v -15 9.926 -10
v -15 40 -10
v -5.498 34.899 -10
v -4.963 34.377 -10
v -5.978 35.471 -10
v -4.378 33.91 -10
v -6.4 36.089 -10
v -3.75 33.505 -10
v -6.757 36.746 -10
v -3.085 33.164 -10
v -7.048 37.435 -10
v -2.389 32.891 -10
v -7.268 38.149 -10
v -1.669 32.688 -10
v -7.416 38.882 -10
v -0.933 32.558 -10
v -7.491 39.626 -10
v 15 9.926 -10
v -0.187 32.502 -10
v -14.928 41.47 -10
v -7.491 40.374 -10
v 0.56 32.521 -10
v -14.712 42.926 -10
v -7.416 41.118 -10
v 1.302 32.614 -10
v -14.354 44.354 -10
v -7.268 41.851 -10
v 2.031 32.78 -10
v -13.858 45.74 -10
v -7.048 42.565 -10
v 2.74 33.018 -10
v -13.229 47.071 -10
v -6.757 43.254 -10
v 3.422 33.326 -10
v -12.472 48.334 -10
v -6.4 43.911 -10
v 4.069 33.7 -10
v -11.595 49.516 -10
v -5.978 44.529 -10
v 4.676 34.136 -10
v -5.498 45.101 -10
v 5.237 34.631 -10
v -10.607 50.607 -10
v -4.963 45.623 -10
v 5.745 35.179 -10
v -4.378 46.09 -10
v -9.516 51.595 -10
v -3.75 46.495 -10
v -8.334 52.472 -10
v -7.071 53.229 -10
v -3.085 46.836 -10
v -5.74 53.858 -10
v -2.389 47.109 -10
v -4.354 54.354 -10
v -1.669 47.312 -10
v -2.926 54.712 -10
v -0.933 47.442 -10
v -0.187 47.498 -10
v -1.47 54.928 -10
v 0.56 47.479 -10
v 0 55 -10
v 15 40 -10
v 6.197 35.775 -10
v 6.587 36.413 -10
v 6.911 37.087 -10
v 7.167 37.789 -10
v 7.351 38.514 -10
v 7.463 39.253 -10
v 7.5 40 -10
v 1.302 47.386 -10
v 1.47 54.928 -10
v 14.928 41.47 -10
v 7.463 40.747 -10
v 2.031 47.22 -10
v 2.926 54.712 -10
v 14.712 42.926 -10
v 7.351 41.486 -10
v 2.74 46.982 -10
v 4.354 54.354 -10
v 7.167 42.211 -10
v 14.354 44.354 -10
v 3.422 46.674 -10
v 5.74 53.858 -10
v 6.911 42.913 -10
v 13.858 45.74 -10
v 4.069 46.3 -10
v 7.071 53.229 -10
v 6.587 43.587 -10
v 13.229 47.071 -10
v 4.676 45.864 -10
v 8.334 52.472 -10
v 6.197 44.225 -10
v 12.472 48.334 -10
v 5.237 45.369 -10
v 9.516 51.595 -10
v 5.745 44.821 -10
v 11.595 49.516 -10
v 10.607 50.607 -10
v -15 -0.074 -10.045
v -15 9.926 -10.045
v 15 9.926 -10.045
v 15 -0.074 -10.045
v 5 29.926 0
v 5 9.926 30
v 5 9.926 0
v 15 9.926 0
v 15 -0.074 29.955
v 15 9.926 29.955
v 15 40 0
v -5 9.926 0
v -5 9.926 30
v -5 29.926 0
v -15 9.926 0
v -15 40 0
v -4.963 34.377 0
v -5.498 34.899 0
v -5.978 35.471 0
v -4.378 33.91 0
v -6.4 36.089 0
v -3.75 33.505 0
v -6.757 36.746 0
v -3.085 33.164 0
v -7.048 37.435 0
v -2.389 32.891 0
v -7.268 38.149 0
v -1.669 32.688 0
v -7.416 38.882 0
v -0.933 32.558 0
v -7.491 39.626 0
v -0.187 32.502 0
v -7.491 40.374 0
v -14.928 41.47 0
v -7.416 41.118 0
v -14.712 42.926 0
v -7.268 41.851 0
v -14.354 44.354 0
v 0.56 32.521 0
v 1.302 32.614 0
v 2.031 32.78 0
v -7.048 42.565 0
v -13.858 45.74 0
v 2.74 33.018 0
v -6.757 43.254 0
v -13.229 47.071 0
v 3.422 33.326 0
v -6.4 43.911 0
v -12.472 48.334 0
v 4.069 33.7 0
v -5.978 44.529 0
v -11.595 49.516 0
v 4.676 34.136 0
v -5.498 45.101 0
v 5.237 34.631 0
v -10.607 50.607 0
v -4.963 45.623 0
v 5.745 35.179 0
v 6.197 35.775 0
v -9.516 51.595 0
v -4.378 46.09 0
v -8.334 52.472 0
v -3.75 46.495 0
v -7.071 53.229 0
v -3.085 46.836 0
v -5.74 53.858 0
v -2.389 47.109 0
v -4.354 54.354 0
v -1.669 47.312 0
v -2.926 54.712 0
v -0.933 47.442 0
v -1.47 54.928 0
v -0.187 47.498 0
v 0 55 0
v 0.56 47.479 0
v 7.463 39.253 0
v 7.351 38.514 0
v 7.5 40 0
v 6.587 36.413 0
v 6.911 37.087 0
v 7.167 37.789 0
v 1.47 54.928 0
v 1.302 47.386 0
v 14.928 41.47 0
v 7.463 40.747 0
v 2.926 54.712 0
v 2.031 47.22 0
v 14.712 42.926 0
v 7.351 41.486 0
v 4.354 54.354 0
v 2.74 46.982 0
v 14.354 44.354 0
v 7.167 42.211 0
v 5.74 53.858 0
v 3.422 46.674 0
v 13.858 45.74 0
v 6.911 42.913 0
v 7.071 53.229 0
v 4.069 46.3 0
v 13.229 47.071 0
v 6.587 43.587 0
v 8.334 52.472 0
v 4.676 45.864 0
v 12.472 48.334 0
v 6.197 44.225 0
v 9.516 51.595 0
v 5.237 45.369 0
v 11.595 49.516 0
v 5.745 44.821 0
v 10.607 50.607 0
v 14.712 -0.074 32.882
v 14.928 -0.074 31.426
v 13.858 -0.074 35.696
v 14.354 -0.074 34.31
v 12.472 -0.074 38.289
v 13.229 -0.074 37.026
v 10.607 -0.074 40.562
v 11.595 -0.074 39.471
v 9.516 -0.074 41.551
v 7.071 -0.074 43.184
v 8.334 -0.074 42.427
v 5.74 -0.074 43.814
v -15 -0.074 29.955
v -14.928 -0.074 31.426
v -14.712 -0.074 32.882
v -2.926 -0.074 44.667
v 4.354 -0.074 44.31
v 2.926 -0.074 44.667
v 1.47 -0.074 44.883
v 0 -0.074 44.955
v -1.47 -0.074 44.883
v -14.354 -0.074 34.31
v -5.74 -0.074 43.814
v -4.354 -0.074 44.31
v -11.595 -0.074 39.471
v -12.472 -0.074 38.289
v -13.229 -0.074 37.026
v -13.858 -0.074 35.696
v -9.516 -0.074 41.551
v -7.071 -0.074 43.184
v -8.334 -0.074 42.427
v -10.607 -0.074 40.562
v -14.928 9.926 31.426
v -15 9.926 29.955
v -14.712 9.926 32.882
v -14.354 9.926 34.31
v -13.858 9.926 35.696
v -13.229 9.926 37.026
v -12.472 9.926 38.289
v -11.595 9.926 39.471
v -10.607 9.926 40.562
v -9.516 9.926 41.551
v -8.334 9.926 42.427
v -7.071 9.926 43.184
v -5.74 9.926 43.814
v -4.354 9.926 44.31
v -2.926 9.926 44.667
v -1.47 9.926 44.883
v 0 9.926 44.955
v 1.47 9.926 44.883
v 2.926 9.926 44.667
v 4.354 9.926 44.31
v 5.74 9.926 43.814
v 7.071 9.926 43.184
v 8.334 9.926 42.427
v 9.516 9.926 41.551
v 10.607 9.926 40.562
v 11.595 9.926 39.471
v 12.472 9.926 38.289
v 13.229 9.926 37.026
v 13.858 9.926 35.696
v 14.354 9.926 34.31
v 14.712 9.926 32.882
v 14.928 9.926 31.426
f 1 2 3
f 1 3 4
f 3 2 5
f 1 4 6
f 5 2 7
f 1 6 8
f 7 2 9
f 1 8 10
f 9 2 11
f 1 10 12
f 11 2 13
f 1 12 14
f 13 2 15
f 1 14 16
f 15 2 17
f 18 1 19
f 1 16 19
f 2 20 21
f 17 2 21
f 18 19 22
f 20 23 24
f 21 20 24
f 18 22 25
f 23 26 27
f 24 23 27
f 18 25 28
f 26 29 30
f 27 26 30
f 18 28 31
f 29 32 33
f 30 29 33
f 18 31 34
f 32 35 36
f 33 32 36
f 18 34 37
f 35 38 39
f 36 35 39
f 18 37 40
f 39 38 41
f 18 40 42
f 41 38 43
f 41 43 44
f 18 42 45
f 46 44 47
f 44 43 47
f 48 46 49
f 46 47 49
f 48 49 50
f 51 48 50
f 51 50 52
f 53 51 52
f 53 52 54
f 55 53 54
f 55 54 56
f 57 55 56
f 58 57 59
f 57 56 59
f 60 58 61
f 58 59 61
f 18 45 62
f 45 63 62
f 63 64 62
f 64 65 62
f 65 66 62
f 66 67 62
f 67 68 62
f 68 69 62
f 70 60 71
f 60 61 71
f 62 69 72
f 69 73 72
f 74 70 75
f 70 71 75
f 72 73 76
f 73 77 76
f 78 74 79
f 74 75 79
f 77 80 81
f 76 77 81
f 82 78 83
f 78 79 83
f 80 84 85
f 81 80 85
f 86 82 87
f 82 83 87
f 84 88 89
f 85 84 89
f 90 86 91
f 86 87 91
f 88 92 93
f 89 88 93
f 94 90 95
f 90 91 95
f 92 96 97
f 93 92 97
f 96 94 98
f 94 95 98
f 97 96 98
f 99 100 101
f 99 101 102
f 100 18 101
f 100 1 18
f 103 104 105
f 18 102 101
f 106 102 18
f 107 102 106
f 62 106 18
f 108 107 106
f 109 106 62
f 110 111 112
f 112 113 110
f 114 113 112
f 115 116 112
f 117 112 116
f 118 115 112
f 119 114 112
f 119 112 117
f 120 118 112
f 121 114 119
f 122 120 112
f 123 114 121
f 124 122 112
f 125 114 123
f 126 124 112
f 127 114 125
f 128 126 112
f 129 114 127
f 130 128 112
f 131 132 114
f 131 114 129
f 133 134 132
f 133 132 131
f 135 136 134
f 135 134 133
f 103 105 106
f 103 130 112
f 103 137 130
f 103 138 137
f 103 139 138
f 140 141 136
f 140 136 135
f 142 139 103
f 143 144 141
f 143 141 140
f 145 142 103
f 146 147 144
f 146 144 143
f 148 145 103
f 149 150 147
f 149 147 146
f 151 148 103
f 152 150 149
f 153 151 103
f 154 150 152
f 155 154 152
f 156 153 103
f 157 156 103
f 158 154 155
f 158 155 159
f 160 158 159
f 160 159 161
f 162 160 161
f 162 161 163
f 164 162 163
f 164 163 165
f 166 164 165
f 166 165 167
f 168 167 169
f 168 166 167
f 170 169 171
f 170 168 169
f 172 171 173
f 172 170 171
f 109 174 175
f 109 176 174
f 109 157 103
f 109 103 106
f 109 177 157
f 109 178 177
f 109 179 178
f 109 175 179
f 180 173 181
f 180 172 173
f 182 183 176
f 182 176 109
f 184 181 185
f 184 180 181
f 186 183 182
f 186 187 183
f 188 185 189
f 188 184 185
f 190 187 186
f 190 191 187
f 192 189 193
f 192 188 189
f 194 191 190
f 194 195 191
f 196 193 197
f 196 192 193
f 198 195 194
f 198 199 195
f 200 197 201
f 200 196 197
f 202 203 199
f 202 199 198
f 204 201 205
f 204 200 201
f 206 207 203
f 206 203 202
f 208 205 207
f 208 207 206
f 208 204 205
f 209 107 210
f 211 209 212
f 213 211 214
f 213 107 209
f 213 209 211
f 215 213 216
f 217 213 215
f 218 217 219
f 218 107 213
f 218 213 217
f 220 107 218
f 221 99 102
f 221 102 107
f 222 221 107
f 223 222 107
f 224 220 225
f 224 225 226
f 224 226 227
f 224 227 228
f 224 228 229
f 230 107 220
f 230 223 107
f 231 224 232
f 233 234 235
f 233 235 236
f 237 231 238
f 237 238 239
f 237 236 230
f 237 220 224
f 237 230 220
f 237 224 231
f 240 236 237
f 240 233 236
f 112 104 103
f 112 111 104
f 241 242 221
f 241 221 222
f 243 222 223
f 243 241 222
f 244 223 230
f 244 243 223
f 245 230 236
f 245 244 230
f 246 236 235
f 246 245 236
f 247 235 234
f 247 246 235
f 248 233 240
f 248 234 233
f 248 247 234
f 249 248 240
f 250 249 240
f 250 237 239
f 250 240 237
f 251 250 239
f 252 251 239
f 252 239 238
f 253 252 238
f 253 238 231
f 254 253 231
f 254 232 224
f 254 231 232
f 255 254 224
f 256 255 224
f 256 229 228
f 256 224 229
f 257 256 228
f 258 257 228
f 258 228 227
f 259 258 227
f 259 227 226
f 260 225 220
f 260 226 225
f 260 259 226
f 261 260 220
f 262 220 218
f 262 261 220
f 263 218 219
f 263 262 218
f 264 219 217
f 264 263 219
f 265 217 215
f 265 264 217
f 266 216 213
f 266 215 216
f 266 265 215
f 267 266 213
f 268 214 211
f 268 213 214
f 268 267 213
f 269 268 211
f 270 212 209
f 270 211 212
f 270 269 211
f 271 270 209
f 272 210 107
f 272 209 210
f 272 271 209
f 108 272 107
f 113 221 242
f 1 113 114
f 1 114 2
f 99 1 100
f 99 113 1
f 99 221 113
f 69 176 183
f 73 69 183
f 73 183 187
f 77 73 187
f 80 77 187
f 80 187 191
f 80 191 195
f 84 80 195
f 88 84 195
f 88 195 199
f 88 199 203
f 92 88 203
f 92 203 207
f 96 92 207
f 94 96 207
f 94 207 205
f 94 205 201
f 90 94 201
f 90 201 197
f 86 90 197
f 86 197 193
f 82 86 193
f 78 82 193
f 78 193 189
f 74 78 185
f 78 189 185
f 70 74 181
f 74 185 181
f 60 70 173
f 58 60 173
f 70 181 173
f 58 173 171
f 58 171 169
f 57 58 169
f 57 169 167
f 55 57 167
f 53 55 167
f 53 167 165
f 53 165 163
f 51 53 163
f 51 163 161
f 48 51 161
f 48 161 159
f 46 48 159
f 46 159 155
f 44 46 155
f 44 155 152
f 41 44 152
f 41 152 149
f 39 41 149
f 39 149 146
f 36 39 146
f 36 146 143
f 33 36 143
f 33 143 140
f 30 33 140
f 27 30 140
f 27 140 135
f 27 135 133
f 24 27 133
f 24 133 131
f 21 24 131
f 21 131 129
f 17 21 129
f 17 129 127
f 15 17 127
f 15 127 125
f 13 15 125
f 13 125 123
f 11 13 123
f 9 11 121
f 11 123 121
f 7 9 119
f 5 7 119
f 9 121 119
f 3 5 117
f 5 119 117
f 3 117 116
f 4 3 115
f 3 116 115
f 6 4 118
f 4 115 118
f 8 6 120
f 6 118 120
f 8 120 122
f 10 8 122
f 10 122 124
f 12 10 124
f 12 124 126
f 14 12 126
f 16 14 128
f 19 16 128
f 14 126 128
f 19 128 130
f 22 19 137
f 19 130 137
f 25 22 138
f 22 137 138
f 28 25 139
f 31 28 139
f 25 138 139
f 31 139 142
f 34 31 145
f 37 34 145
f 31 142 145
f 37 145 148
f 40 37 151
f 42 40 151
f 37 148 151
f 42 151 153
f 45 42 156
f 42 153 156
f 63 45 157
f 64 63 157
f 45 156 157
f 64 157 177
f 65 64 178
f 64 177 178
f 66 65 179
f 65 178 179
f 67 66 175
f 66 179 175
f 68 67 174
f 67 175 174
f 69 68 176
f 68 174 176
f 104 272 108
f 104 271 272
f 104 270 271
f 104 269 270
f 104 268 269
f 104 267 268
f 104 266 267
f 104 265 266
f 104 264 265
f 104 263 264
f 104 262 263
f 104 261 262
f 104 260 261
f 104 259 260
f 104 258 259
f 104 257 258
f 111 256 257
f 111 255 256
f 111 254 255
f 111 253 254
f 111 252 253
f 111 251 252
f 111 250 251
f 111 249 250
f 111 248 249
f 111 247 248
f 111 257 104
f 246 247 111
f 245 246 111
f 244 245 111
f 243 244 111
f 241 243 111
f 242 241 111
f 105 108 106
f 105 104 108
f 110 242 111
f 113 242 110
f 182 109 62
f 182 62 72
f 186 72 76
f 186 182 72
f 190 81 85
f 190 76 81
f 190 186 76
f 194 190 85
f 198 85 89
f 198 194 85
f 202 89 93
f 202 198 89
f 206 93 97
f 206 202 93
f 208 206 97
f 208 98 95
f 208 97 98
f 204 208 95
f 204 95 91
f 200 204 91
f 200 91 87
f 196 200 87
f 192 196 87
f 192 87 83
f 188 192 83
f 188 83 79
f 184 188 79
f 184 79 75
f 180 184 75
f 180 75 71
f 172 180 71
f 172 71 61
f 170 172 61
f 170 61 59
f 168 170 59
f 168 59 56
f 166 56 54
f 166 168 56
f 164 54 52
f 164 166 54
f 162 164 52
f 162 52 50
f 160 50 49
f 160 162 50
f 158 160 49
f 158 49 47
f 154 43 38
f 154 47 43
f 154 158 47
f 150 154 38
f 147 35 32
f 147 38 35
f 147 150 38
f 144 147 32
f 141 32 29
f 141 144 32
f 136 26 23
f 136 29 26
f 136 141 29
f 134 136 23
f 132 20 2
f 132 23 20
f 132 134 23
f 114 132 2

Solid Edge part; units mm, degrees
sketch "Sketch1" plane through (0, 0, 0) normal (0, 0, 1) x (1, 0, 0)
  line L0 (15, 0) -> (15, 40)
  line L1 (-15, 0) -> (15, 0)
  line L2 (-15, 40) -> (-15, 0)
  arc A0 (-15, 40) -> (15, 40) centre (0, 40) cw
extrude "Protrusion1" add sketch "Sketch1" against normal blind 10
sketch "Sketch2" plane through (0, 0, 0) normal (0, 0, 1) x (1, 0, 0)
  circle A0 centre (0, 40) radius 7.5
extrude "ExtrudedCutout_2" cut sketch "Sketch2" against normal blind 10
sketch "Sketch3" plane through (-15, 20, -5) normal (-1, 0, 0) x (0, 0, 1)
  line L0 (34.9554, -10.0744) -> (-5.0446, -10.0744)
  line L1 (-5.0446, -10.0744) -> (-5.0446, -20.0744)
  line L2 (-5.0446, -20.0744) -> (34.9554, -20.0744)
  line L3 (34.9554, -20.0744) -> (34.9554, -10.0744)
extrude "ExtrudedProtrusion_2" add sketch "Sketch3" against normal blind 30
sketch "Sketch4" plane through (0, 9.9256, 14.9777) normal (0, 1, 0) x (1, 0, 0)
  arc A0 (14.9999, -14.9131) -> (-14.9999, -14.9131) centre (0, -14.9777) cw
extrude "ExtrudedProtrusion_3" add sketch "Sketch4" against normal blind 10 material side at (0, 9.9256, 44.9054)
sketch "Sketch5" plane through (0, 0, 0) normal (1, 0, 0) x (0, 1, 0)
  line L0 (9.9256, 30) -> (29.9256, 0)
  line L1 (9.9256, 0) -> (29.9256, 0)
  line L2 (9.9256, 0) -> (9.9256, 30)
extrude "ExtrudedProtrusion_5" add sketch "Sketch5" along normal blind 5
sketch "Sketch6" plane through (0, 0, 0) normal (1, 0, 0) x (0, 1, 0)
  line L0 (9.9256, 30) -> (29.9256, 0)
  line L1 (9.9256, 0) -> (29.9256, 0)
  line L2 (9.9256, 0) -> (9.9256, 30)
extrude "ExtrudedProtrusion_6" add sketch "Sketch6" against normal blind 5
